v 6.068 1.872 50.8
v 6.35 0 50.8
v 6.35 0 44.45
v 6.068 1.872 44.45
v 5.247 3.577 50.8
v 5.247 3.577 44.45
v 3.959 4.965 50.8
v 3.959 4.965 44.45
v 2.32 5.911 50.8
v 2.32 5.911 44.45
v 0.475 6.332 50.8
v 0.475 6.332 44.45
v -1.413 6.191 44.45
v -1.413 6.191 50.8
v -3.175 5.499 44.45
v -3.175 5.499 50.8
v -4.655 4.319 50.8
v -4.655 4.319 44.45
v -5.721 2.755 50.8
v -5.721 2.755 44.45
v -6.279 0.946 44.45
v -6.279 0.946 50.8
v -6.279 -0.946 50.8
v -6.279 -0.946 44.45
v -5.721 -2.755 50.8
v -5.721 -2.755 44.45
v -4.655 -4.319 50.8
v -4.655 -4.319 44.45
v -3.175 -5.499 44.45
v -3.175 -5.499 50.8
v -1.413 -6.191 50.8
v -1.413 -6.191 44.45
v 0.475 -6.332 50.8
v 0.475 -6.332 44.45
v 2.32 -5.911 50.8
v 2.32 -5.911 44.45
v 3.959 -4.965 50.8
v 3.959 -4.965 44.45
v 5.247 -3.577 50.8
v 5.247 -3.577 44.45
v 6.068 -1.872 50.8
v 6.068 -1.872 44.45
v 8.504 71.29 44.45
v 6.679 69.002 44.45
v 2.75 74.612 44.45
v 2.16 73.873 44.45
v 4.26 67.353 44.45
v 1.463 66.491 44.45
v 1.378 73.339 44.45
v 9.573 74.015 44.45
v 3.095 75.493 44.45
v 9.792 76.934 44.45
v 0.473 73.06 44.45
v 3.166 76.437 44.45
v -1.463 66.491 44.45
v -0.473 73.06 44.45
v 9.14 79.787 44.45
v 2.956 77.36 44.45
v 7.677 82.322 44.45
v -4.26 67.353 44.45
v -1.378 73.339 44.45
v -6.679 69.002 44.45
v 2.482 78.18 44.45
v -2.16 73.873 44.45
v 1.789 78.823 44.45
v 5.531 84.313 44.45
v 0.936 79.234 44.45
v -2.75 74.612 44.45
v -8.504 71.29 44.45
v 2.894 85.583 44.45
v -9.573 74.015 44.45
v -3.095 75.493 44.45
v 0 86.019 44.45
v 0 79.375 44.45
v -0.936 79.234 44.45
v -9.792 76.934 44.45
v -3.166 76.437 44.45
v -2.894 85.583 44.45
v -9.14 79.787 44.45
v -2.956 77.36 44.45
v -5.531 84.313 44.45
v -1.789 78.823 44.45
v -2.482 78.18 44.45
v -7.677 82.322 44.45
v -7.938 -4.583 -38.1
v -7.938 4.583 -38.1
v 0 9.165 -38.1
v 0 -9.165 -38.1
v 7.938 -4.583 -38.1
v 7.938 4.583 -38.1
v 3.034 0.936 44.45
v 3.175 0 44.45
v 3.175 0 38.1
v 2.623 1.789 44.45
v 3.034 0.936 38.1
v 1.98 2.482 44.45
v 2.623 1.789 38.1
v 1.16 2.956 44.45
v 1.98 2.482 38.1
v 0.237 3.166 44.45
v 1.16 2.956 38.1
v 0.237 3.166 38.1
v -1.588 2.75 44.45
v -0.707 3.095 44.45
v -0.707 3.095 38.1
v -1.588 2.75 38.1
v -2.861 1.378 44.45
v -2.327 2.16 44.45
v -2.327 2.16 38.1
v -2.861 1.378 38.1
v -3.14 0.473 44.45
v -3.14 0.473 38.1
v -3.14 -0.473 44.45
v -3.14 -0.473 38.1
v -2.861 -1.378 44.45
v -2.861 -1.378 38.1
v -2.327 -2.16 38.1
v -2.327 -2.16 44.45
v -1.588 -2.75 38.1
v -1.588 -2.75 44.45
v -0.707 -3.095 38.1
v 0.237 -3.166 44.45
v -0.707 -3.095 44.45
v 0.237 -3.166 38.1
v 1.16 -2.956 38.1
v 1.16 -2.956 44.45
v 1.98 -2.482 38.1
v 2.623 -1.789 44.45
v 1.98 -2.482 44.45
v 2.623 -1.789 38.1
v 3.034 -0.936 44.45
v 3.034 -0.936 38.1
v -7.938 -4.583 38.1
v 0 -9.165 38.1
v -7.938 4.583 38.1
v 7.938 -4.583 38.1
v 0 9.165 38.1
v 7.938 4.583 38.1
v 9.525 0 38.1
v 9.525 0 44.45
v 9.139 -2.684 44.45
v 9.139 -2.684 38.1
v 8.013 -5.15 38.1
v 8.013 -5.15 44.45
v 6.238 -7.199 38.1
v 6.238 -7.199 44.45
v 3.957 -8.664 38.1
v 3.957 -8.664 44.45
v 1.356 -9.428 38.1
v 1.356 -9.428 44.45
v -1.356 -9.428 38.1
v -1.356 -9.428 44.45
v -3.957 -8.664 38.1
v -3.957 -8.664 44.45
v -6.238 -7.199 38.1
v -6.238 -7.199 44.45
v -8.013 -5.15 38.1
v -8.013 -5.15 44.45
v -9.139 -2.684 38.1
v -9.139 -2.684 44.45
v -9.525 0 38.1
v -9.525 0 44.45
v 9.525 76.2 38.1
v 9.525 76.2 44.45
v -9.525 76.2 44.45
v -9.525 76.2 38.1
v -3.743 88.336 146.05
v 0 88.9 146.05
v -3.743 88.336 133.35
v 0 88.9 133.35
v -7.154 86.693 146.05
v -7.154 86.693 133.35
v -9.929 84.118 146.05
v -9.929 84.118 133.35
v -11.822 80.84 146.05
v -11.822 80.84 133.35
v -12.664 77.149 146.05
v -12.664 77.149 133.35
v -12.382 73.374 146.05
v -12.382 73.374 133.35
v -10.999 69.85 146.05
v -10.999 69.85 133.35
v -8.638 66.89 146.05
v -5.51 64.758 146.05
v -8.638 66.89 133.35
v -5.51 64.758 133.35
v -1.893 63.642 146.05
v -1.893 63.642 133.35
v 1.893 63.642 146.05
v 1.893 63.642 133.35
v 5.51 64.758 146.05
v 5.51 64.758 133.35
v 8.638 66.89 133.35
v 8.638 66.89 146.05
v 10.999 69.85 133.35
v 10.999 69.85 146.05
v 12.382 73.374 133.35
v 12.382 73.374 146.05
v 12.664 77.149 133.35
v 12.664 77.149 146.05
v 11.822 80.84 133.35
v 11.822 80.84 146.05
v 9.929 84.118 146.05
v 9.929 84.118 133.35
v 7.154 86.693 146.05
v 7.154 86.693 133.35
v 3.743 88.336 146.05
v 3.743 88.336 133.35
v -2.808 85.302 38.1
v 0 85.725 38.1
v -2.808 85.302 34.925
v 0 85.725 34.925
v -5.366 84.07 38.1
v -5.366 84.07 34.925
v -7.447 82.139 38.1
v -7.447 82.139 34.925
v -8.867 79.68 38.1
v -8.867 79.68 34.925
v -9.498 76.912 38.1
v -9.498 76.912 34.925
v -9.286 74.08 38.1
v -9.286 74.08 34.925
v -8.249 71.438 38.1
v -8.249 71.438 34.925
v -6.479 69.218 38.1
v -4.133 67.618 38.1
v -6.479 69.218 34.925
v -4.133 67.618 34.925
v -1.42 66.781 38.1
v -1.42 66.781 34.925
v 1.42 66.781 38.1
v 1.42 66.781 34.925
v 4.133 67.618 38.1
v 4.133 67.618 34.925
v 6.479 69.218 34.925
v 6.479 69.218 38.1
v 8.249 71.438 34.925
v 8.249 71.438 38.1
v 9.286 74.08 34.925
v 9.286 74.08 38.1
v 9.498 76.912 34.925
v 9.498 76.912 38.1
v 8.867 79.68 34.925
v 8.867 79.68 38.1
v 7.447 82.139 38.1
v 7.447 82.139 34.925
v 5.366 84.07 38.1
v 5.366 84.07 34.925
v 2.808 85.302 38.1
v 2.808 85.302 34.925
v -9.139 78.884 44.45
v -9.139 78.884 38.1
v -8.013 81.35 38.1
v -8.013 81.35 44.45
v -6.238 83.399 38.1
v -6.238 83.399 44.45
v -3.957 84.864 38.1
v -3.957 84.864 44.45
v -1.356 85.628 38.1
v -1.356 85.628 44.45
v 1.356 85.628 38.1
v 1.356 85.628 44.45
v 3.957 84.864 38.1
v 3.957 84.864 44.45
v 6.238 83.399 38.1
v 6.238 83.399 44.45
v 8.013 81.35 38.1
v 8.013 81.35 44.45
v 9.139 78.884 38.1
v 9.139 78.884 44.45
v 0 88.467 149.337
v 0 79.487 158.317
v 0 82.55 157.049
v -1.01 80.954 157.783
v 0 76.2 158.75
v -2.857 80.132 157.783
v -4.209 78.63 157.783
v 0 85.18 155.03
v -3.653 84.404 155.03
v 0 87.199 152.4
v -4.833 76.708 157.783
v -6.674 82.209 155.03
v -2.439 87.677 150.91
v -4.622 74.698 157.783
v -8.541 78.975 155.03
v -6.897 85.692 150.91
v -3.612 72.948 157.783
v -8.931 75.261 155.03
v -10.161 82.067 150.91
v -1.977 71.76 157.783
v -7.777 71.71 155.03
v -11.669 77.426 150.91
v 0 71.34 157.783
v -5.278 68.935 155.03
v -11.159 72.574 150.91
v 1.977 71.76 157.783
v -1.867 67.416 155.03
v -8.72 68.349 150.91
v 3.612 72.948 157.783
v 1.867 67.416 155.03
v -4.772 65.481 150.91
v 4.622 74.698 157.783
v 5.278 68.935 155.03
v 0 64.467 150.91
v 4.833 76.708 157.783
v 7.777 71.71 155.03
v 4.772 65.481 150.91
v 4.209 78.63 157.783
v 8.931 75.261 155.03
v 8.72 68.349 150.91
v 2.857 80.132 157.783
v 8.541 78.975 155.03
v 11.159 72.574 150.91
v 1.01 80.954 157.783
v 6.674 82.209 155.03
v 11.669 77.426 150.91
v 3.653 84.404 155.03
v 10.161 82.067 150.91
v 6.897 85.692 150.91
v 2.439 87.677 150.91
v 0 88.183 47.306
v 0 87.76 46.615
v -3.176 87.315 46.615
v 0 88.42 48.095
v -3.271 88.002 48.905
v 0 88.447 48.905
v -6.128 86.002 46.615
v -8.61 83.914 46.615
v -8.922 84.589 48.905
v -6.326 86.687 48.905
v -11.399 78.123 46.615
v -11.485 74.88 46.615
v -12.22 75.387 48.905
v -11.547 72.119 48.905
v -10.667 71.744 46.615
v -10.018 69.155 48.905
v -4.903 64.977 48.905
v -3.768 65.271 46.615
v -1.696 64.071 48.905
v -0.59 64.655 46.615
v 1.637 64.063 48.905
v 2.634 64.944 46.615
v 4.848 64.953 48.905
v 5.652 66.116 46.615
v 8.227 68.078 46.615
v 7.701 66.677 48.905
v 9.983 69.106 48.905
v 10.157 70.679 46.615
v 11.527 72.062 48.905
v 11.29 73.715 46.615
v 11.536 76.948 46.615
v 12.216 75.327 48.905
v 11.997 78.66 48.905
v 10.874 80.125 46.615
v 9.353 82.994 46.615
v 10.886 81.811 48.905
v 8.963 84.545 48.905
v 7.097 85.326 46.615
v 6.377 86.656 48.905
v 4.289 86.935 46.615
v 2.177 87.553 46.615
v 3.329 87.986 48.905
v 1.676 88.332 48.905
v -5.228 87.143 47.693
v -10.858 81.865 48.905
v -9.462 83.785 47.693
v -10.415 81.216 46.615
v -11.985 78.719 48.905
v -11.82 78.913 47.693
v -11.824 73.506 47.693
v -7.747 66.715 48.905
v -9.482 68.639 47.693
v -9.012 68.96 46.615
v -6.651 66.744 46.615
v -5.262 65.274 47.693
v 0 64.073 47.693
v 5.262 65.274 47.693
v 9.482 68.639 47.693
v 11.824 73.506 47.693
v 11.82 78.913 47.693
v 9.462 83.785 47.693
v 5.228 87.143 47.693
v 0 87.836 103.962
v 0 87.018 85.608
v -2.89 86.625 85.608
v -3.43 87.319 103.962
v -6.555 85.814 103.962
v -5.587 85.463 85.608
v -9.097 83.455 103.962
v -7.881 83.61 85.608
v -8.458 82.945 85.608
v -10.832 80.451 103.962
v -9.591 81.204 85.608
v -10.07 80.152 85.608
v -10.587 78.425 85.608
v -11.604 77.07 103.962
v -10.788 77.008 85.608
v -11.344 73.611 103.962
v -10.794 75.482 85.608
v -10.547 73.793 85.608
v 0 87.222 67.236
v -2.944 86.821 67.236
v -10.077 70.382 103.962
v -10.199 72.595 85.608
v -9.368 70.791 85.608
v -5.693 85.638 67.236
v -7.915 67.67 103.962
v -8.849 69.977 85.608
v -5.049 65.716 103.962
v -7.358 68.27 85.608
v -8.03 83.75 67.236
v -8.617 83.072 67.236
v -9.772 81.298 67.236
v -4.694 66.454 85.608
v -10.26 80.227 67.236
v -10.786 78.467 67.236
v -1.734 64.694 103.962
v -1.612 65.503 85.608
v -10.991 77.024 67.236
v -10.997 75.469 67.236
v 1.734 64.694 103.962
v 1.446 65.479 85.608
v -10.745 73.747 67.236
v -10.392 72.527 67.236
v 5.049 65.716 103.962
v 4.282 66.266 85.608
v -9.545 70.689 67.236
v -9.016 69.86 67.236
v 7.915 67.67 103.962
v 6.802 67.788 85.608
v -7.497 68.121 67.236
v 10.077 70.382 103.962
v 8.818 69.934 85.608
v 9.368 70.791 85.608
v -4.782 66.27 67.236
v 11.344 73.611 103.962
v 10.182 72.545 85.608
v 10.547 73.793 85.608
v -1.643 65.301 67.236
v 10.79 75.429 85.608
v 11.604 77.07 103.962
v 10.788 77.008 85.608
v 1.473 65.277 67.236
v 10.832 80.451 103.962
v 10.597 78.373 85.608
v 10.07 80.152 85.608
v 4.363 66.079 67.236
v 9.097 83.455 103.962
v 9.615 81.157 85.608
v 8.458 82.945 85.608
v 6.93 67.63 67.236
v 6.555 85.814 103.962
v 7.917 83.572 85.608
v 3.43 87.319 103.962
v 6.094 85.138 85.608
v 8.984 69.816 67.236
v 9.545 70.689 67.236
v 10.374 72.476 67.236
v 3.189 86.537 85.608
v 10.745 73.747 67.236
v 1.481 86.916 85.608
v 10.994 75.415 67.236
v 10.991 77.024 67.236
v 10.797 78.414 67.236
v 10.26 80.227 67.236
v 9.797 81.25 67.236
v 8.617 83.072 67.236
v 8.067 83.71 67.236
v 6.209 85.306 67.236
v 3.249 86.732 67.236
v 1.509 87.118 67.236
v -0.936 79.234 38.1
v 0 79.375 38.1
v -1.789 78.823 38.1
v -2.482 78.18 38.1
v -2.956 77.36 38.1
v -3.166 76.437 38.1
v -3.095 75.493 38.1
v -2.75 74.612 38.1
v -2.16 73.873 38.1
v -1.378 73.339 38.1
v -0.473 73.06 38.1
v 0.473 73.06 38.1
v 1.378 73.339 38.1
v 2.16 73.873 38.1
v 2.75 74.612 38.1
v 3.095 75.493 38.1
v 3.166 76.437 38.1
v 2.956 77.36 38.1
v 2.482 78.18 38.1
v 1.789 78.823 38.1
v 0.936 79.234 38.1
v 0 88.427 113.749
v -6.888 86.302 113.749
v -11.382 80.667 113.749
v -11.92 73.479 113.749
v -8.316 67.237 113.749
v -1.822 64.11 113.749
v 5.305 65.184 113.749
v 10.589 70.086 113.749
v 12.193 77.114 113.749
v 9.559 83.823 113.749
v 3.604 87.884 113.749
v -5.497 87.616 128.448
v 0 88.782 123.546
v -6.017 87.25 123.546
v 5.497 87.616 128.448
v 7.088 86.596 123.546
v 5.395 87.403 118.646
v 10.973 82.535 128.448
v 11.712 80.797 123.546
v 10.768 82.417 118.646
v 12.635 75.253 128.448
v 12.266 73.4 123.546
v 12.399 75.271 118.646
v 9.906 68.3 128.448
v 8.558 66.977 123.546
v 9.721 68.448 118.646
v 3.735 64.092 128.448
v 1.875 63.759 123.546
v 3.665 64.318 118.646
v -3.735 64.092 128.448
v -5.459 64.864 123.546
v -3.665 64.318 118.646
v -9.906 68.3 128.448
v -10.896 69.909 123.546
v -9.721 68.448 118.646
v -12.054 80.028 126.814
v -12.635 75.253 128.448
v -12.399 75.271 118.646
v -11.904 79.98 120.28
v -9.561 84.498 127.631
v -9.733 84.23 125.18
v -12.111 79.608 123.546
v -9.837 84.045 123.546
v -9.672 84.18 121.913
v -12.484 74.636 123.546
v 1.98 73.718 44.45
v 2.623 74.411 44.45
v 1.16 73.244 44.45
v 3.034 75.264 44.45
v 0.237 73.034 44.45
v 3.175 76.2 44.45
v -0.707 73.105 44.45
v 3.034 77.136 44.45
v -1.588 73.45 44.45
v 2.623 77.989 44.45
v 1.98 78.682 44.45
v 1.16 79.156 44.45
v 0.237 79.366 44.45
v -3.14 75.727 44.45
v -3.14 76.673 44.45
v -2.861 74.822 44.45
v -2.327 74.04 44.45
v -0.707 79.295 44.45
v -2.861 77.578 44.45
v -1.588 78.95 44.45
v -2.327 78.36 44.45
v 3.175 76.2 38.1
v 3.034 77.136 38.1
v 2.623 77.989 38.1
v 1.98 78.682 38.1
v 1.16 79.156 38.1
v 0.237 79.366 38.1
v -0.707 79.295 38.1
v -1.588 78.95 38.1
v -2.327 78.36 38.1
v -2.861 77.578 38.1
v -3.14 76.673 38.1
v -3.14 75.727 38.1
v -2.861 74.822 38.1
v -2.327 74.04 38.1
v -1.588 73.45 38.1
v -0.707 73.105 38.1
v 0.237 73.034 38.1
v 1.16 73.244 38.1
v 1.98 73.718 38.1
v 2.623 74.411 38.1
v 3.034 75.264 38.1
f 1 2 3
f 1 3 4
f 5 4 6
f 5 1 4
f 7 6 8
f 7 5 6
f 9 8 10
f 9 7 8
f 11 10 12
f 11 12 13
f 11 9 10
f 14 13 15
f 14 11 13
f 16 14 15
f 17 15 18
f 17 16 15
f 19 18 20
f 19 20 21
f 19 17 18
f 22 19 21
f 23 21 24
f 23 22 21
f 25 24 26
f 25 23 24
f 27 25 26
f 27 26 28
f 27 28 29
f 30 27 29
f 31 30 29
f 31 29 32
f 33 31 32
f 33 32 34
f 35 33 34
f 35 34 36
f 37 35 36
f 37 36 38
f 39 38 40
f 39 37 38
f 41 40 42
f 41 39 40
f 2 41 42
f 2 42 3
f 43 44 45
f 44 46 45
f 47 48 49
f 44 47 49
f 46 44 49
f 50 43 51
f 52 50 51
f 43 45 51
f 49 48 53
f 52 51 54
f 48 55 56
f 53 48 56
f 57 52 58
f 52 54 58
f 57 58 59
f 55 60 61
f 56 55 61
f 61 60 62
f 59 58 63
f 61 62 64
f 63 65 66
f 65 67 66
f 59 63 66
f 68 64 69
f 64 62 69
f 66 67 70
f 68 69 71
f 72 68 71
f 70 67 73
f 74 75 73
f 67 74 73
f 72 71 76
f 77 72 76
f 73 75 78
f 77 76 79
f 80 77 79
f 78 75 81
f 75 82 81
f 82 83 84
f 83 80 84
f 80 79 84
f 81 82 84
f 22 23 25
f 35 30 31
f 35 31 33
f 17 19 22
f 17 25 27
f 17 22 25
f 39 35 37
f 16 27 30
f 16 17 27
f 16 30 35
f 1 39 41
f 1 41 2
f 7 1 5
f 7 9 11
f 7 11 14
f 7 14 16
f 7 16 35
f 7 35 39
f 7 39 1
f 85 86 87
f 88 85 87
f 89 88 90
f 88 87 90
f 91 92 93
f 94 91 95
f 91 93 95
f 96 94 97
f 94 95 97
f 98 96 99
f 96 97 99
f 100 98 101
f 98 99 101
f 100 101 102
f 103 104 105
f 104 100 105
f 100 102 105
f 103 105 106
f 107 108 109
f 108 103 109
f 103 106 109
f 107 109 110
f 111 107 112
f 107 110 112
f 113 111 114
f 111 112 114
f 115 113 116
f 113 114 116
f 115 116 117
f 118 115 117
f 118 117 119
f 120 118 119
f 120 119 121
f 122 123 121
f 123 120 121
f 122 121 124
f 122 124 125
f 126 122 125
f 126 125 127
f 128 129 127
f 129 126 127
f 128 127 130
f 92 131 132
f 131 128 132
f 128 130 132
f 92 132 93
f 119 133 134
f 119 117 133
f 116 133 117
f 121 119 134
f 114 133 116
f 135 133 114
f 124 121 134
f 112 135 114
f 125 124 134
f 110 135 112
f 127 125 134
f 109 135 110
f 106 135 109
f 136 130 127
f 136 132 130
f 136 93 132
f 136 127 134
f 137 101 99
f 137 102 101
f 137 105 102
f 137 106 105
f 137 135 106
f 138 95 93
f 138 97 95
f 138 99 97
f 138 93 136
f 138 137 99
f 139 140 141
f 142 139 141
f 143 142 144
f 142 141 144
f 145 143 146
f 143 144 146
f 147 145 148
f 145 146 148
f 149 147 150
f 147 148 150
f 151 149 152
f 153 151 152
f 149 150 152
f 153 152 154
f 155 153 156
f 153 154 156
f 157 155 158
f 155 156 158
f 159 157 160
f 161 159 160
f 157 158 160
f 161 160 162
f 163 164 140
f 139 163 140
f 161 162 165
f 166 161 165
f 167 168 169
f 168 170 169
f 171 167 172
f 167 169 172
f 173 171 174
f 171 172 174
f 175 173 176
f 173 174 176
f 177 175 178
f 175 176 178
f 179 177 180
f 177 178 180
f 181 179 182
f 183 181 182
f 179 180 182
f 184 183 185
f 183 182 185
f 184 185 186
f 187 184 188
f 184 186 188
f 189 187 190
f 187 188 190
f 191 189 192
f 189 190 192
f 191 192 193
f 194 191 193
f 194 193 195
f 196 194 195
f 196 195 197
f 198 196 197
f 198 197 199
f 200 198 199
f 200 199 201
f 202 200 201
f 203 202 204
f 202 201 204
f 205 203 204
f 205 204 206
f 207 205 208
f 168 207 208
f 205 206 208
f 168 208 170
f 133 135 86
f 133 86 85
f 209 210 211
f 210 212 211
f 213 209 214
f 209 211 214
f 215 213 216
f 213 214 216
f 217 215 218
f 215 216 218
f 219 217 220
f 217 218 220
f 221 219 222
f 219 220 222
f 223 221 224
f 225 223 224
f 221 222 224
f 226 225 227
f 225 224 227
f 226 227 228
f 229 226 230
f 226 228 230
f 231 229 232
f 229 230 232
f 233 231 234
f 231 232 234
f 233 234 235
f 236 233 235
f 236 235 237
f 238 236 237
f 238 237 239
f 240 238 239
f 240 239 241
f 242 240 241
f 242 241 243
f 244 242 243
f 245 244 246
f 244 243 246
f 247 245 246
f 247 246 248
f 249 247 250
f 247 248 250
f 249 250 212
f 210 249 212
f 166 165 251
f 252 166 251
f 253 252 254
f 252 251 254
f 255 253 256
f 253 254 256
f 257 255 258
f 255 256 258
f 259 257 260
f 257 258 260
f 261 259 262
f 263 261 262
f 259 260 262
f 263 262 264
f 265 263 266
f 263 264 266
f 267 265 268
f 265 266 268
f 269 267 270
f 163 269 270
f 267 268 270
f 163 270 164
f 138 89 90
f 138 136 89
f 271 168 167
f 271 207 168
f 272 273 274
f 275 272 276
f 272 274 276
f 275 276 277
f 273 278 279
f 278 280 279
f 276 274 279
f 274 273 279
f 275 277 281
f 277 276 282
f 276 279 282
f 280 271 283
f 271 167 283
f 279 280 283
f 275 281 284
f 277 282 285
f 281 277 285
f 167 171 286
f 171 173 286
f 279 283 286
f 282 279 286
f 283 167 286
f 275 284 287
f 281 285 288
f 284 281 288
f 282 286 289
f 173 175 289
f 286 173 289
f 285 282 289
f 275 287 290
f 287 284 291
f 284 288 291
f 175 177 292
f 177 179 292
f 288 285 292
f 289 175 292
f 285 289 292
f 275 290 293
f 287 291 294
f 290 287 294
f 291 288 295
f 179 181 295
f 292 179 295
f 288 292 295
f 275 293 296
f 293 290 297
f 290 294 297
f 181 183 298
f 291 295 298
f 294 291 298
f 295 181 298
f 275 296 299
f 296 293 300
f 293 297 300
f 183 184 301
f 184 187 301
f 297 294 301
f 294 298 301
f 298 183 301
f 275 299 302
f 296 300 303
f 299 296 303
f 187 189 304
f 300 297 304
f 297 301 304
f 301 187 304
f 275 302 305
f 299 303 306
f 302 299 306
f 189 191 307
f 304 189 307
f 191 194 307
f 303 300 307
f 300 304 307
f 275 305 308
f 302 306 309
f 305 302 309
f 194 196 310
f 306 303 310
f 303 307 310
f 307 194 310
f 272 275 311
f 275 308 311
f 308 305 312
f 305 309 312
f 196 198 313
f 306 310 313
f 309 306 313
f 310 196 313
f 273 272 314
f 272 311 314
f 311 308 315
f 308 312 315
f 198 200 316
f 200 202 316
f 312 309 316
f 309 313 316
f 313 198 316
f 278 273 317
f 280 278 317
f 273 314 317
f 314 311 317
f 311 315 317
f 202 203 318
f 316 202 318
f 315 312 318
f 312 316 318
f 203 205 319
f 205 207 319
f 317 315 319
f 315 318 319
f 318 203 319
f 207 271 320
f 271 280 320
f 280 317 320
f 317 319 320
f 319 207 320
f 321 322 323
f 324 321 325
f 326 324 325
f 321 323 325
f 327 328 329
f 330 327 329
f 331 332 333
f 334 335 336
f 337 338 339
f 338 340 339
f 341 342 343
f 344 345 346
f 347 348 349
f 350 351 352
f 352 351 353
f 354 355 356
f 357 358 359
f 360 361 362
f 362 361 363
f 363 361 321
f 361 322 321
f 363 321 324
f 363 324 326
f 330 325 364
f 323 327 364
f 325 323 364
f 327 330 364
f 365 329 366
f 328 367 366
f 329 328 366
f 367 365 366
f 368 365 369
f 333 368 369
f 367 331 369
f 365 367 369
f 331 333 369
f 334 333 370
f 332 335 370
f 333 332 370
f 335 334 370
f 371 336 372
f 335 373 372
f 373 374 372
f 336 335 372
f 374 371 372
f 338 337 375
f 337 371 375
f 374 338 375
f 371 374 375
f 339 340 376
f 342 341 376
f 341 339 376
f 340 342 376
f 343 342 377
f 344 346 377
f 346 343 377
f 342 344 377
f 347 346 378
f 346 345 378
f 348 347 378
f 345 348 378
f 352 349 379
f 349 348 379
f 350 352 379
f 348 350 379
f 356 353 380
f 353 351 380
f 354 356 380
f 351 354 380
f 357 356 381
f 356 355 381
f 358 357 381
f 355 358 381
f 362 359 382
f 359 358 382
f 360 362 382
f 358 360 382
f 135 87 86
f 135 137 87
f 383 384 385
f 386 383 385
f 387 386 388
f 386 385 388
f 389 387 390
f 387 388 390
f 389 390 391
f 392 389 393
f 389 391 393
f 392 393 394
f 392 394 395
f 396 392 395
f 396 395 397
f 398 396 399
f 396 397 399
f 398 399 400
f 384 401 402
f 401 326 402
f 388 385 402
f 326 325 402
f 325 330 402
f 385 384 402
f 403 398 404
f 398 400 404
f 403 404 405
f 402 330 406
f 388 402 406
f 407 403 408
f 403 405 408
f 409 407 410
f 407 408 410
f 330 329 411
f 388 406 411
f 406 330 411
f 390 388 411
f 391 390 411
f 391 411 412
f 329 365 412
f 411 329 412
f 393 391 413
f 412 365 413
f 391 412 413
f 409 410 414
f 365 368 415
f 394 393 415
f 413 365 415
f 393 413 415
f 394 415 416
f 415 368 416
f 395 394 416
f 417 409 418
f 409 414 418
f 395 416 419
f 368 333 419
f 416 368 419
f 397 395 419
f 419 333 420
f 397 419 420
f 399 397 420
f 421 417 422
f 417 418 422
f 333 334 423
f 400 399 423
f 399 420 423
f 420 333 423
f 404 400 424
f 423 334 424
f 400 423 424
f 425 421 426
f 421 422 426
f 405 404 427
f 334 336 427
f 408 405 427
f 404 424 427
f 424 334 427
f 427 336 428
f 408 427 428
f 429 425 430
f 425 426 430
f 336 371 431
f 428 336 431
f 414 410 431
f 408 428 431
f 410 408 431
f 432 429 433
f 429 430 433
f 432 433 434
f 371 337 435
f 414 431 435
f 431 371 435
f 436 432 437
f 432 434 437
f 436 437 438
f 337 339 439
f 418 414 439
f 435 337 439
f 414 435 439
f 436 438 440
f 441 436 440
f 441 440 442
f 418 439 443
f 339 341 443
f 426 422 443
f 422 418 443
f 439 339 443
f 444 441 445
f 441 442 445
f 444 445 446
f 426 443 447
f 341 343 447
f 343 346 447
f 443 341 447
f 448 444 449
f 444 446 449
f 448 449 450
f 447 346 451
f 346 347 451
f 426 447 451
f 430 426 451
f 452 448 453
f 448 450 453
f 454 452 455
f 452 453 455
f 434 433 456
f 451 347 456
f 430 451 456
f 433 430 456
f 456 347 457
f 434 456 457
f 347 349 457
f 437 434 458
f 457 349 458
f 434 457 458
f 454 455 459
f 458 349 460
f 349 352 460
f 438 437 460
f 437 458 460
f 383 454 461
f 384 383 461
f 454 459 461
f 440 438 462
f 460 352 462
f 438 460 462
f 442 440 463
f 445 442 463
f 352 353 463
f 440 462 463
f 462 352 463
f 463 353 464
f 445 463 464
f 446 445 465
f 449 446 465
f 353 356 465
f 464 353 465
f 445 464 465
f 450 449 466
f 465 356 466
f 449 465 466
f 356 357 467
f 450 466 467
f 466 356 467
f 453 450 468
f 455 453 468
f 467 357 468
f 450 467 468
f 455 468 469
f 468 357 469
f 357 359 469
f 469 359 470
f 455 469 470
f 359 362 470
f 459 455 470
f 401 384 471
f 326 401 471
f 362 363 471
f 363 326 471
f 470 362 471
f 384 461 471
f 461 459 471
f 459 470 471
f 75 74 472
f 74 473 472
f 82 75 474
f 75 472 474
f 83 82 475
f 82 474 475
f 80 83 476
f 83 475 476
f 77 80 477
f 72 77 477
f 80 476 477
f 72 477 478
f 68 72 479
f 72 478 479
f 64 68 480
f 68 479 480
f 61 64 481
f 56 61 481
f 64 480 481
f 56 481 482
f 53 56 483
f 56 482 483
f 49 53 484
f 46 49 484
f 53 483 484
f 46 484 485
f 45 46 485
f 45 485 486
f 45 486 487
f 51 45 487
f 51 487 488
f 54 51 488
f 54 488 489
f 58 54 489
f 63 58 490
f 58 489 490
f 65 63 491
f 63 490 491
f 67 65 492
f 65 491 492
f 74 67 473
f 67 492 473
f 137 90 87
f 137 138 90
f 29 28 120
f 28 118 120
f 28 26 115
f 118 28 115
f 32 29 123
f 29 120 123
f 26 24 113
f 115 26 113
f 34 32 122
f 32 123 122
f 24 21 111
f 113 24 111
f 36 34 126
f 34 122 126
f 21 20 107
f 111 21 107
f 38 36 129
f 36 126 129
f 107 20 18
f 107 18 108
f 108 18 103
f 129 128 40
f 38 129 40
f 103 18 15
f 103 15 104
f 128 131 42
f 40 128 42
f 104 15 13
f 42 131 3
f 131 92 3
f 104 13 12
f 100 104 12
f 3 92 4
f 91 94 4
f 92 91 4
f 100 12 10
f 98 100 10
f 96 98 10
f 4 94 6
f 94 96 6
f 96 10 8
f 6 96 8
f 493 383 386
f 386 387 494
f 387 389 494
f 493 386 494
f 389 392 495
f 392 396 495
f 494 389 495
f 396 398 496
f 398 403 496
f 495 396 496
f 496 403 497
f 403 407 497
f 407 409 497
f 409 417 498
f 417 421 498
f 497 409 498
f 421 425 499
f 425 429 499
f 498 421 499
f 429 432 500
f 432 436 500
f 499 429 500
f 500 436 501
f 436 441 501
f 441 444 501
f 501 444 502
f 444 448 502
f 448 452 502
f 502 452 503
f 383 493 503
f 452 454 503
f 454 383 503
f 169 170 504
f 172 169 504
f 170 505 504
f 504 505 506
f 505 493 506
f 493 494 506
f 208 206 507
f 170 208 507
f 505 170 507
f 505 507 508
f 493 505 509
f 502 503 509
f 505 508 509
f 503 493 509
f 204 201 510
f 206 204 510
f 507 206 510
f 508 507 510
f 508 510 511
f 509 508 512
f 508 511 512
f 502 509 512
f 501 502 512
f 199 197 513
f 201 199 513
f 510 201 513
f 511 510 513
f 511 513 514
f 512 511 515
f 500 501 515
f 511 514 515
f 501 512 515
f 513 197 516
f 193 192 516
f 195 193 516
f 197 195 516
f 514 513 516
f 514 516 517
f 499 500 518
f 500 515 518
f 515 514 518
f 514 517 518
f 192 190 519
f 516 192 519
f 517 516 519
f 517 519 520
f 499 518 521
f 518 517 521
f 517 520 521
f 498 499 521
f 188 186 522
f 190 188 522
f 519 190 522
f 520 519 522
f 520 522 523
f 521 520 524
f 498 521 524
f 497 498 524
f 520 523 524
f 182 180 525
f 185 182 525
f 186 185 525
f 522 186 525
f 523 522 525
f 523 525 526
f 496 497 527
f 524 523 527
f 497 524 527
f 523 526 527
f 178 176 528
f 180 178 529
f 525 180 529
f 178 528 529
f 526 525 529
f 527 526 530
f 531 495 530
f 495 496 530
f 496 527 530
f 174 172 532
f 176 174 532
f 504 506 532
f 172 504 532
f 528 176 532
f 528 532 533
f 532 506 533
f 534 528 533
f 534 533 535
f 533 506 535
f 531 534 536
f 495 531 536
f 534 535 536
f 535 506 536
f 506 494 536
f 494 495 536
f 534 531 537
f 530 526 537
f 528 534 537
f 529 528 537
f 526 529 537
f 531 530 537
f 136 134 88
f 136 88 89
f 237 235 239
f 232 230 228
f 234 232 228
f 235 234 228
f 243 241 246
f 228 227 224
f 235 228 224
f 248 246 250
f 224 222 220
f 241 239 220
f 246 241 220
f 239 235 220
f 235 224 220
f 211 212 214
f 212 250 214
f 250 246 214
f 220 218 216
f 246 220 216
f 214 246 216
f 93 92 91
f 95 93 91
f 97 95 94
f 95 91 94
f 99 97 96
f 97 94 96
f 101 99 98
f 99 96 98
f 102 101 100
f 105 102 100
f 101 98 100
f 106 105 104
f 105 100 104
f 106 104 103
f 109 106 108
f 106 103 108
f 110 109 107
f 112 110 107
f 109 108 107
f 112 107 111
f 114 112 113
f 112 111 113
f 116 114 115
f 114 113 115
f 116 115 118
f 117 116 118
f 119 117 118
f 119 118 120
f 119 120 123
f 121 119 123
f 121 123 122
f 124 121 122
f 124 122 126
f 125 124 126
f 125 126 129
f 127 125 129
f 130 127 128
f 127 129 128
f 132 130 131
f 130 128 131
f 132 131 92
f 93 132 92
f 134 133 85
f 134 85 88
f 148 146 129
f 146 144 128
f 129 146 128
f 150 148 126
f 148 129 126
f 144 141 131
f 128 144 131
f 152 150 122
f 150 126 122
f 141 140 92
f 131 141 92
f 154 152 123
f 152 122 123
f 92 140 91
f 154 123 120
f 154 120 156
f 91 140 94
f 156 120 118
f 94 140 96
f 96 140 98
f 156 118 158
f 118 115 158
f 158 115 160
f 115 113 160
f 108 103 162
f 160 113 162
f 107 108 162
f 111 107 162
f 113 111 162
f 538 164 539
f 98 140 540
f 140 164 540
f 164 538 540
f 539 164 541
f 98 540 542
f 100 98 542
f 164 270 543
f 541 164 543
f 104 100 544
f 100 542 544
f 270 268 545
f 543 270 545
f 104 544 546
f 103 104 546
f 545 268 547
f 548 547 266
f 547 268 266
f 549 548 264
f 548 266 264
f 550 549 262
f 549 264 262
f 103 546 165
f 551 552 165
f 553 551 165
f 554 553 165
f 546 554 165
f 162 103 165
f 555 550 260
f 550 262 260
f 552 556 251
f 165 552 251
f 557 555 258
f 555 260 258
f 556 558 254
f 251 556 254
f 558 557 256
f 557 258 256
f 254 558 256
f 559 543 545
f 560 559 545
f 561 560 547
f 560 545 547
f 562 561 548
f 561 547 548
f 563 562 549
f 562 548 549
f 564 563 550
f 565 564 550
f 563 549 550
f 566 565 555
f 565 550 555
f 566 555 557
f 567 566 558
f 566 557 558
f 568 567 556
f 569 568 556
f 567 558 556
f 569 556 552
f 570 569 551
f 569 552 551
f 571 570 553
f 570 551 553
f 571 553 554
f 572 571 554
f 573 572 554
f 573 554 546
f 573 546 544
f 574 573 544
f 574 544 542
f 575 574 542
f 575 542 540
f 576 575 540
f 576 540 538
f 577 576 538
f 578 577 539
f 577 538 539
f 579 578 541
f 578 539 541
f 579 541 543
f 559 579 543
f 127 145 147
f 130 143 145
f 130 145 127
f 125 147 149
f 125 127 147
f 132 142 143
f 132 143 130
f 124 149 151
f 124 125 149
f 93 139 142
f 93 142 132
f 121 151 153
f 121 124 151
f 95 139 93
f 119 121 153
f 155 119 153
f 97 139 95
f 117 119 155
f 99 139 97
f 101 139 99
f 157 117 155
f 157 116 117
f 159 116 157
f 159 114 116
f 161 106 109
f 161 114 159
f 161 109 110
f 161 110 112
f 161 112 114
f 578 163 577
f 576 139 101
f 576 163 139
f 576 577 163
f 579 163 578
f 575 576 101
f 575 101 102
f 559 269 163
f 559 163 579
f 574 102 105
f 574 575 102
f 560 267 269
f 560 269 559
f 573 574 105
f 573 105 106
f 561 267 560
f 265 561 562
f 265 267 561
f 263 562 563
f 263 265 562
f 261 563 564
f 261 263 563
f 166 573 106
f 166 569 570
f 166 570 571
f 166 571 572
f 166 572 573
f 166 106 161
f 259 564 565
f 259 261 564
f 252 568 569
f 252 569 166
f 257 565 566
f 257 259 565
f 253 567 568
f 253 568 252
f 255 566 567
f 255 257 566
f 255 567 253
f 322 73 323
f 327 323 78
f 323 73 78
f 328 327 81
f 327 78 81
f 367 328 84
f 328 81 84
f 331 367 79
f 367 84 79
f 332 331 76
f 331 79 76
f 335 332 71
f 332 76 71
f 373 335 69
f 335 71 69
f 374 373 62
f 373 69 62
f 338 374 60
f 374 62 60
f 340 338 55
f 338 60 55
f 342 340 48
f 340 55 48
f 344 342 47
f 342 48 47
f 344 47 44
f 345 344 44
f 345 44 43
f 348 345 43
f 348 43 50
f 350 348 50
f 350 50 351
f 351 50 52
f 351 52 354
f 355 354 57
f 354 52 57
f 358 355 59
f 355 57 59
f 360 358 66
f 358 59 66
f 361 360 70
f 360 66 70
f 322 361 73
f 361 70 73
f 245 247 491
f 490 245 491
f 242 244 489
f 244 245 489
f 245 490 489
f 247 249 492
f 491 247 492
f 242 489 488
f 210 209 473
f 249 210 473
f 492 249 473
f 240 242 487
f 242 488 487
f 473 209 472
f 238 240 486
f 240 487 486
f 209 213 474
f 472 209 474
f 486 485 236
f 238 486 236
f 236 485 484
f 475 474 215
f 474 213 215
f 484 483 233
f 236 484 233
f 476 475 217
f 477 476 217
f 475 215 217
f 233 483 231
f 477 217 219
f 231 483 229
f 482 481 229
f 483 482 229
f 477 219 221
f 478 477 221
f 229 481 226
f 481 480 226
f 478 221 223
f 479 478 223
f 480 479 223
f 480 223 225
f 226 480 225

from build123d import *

# Parameters (mm, degrees)
BOSS_EXTRUDE1_DEPTH = 38.1
SKETCH2_R           = 3.175
BOSS_EXTRUDE2_DEPTH = 12.7
SKETCH5_R           = 6.35
BOSS_EXTRUDE4_DEPTH = 6.35
SKETCH3_R           = 3.175
BOSS_EXTRUDE3_DEPTH = 6.35
CHAMFER1_SIZE       = 2.880922897
FILLET1_R           = 3.175


with BuildPart() as part:
    # Sketch1 → Boss-Extrude1 (new, symmetric)
    with BuildSketch(Plane.XY):
        Polygon((0, 9.165435523), (-7.9375, 4.582717762), (-7.9375, -4.582717762), (0, -9.165435523), (7.9375, -4.582717762), (7.9375, 4.582717762), align=None)
    extrude(amount=BOSS_EXTRUDE1_DEPTH, both=True)

    # Sketch2 → Boss-Extrude2 (add)
    with BuildSketch(Plane.XY.offset(38.1)):
        Circle(SKETCH2_R)
    extrude(amount=BOSS_EXTRUDE2_DEPTH)

    # Sketch5 → Boss-Extrude4 (add)
    with BuildSketch(Plane.XY.offset(50.8)):
        Circle(SKETCH5_R)
    extrude(amount=-BOSS_EXTRUDE4_DEPTH)


with BuildPart() as body_2:
    # Sketch3 → Boss-Extrude3 (new body)
    with BuildSketch(Plane.XY.offset(44.45)):
        with BuildLine():
            Line((-9.525, 0), (-9.525, 76.2))
            ThreePointArc((-9.525, 76.2), (0, 85.725), (9.525, 76.2))
            Line((9.525, 76.2), (9.525, 0))
            ThreePointArc((9.525, 0), (0, -9.525), (-9.525, 0))
        make_face()
        Circle(SKETCH3_R, mode=Mode.SUBTRACT)
        with Locations((0, 76.2)):
            Circle(SKETCH3_R, mode=Mode.SUBTRACT)
    extrude(amount=-BOSS_EXTRUDE3_DEPTH)


with BuildPart() as body_3:
    # Sketch6 → Revolve1 (revolve)
    with BuildSketch(Plane(origin=(0, 0, 0), x_dir=(0, 0, -1), z_dir=(1, 0, 0))):
        with BuildLine():
            Line((-38.1, 79.375), (-38.1, 85.725))
            Line((-38.1, 85.725), (-34.925, 85.725))
            Line((-34.925, 85.725), (-34.925, 76.2))
            Line((-34.925, 76.2), (-158.75, 76.2))
            ThreePointArc((-158.75, 76.2), (-155.030256121, 85.180256121), (-146.05, 88.9))
            Line((-146.05, 88.9), (-133.35, 88.9))
            ThreePointArc((-133.35, 88.9), (-118.646407511, 88.633924178), (-103.962068321, 87.836045118))
            ThreePointArc((-103.962068321, 87.836045118), (-74.182011823, 87.024338682), (-44.45, 88.9))
            Line((-44.45, 88.9), (-44.45, 79.375))
            Line((-44.45, 79.375), (-38.1, 79.375))
        make_face()
    revolve(axis=Axis((0, 76.2, 34.925), (0, 0, 1)))

    # Chamfer1
    # the kernel refuses this chamfer: 3.175, 2.880922897 mm, written as the material it takes off along each edge
    with BuildSketch(Plane(origin=(0, 76.2, 44.45), x_dir=(0, 1, 0), z_dir=(1, 0, 0))) as chamfer1_piece_1:
        with BuildLine():
            Line((12.371021751, 3.173444219), (12.7 - CHAMFER1_SIZE, 0))
            Line((12.7 - CHAMFER1_SIZE, 0), (12.7, 0))
            ThreePointArc((12.7, 0), (12.527028201, 1.631208875), (12.371021751, 3.173444219))
        make_face()
    revolve(axis=Axis((0, 76.2, 44.45), (0, 0, 1)), mode=Mode.SUBTRACT)

    # Fillet1
    fillet1_edges = [body_3.edges().sort_by_distance(p)[0] for p in [
        (0, 63.828978249, 47.623444219),
    ]]
    fillet(fillet1_edges, radius=FILLET1_R)


solid = Compound([part.part, body_2.part, body_3.part])
